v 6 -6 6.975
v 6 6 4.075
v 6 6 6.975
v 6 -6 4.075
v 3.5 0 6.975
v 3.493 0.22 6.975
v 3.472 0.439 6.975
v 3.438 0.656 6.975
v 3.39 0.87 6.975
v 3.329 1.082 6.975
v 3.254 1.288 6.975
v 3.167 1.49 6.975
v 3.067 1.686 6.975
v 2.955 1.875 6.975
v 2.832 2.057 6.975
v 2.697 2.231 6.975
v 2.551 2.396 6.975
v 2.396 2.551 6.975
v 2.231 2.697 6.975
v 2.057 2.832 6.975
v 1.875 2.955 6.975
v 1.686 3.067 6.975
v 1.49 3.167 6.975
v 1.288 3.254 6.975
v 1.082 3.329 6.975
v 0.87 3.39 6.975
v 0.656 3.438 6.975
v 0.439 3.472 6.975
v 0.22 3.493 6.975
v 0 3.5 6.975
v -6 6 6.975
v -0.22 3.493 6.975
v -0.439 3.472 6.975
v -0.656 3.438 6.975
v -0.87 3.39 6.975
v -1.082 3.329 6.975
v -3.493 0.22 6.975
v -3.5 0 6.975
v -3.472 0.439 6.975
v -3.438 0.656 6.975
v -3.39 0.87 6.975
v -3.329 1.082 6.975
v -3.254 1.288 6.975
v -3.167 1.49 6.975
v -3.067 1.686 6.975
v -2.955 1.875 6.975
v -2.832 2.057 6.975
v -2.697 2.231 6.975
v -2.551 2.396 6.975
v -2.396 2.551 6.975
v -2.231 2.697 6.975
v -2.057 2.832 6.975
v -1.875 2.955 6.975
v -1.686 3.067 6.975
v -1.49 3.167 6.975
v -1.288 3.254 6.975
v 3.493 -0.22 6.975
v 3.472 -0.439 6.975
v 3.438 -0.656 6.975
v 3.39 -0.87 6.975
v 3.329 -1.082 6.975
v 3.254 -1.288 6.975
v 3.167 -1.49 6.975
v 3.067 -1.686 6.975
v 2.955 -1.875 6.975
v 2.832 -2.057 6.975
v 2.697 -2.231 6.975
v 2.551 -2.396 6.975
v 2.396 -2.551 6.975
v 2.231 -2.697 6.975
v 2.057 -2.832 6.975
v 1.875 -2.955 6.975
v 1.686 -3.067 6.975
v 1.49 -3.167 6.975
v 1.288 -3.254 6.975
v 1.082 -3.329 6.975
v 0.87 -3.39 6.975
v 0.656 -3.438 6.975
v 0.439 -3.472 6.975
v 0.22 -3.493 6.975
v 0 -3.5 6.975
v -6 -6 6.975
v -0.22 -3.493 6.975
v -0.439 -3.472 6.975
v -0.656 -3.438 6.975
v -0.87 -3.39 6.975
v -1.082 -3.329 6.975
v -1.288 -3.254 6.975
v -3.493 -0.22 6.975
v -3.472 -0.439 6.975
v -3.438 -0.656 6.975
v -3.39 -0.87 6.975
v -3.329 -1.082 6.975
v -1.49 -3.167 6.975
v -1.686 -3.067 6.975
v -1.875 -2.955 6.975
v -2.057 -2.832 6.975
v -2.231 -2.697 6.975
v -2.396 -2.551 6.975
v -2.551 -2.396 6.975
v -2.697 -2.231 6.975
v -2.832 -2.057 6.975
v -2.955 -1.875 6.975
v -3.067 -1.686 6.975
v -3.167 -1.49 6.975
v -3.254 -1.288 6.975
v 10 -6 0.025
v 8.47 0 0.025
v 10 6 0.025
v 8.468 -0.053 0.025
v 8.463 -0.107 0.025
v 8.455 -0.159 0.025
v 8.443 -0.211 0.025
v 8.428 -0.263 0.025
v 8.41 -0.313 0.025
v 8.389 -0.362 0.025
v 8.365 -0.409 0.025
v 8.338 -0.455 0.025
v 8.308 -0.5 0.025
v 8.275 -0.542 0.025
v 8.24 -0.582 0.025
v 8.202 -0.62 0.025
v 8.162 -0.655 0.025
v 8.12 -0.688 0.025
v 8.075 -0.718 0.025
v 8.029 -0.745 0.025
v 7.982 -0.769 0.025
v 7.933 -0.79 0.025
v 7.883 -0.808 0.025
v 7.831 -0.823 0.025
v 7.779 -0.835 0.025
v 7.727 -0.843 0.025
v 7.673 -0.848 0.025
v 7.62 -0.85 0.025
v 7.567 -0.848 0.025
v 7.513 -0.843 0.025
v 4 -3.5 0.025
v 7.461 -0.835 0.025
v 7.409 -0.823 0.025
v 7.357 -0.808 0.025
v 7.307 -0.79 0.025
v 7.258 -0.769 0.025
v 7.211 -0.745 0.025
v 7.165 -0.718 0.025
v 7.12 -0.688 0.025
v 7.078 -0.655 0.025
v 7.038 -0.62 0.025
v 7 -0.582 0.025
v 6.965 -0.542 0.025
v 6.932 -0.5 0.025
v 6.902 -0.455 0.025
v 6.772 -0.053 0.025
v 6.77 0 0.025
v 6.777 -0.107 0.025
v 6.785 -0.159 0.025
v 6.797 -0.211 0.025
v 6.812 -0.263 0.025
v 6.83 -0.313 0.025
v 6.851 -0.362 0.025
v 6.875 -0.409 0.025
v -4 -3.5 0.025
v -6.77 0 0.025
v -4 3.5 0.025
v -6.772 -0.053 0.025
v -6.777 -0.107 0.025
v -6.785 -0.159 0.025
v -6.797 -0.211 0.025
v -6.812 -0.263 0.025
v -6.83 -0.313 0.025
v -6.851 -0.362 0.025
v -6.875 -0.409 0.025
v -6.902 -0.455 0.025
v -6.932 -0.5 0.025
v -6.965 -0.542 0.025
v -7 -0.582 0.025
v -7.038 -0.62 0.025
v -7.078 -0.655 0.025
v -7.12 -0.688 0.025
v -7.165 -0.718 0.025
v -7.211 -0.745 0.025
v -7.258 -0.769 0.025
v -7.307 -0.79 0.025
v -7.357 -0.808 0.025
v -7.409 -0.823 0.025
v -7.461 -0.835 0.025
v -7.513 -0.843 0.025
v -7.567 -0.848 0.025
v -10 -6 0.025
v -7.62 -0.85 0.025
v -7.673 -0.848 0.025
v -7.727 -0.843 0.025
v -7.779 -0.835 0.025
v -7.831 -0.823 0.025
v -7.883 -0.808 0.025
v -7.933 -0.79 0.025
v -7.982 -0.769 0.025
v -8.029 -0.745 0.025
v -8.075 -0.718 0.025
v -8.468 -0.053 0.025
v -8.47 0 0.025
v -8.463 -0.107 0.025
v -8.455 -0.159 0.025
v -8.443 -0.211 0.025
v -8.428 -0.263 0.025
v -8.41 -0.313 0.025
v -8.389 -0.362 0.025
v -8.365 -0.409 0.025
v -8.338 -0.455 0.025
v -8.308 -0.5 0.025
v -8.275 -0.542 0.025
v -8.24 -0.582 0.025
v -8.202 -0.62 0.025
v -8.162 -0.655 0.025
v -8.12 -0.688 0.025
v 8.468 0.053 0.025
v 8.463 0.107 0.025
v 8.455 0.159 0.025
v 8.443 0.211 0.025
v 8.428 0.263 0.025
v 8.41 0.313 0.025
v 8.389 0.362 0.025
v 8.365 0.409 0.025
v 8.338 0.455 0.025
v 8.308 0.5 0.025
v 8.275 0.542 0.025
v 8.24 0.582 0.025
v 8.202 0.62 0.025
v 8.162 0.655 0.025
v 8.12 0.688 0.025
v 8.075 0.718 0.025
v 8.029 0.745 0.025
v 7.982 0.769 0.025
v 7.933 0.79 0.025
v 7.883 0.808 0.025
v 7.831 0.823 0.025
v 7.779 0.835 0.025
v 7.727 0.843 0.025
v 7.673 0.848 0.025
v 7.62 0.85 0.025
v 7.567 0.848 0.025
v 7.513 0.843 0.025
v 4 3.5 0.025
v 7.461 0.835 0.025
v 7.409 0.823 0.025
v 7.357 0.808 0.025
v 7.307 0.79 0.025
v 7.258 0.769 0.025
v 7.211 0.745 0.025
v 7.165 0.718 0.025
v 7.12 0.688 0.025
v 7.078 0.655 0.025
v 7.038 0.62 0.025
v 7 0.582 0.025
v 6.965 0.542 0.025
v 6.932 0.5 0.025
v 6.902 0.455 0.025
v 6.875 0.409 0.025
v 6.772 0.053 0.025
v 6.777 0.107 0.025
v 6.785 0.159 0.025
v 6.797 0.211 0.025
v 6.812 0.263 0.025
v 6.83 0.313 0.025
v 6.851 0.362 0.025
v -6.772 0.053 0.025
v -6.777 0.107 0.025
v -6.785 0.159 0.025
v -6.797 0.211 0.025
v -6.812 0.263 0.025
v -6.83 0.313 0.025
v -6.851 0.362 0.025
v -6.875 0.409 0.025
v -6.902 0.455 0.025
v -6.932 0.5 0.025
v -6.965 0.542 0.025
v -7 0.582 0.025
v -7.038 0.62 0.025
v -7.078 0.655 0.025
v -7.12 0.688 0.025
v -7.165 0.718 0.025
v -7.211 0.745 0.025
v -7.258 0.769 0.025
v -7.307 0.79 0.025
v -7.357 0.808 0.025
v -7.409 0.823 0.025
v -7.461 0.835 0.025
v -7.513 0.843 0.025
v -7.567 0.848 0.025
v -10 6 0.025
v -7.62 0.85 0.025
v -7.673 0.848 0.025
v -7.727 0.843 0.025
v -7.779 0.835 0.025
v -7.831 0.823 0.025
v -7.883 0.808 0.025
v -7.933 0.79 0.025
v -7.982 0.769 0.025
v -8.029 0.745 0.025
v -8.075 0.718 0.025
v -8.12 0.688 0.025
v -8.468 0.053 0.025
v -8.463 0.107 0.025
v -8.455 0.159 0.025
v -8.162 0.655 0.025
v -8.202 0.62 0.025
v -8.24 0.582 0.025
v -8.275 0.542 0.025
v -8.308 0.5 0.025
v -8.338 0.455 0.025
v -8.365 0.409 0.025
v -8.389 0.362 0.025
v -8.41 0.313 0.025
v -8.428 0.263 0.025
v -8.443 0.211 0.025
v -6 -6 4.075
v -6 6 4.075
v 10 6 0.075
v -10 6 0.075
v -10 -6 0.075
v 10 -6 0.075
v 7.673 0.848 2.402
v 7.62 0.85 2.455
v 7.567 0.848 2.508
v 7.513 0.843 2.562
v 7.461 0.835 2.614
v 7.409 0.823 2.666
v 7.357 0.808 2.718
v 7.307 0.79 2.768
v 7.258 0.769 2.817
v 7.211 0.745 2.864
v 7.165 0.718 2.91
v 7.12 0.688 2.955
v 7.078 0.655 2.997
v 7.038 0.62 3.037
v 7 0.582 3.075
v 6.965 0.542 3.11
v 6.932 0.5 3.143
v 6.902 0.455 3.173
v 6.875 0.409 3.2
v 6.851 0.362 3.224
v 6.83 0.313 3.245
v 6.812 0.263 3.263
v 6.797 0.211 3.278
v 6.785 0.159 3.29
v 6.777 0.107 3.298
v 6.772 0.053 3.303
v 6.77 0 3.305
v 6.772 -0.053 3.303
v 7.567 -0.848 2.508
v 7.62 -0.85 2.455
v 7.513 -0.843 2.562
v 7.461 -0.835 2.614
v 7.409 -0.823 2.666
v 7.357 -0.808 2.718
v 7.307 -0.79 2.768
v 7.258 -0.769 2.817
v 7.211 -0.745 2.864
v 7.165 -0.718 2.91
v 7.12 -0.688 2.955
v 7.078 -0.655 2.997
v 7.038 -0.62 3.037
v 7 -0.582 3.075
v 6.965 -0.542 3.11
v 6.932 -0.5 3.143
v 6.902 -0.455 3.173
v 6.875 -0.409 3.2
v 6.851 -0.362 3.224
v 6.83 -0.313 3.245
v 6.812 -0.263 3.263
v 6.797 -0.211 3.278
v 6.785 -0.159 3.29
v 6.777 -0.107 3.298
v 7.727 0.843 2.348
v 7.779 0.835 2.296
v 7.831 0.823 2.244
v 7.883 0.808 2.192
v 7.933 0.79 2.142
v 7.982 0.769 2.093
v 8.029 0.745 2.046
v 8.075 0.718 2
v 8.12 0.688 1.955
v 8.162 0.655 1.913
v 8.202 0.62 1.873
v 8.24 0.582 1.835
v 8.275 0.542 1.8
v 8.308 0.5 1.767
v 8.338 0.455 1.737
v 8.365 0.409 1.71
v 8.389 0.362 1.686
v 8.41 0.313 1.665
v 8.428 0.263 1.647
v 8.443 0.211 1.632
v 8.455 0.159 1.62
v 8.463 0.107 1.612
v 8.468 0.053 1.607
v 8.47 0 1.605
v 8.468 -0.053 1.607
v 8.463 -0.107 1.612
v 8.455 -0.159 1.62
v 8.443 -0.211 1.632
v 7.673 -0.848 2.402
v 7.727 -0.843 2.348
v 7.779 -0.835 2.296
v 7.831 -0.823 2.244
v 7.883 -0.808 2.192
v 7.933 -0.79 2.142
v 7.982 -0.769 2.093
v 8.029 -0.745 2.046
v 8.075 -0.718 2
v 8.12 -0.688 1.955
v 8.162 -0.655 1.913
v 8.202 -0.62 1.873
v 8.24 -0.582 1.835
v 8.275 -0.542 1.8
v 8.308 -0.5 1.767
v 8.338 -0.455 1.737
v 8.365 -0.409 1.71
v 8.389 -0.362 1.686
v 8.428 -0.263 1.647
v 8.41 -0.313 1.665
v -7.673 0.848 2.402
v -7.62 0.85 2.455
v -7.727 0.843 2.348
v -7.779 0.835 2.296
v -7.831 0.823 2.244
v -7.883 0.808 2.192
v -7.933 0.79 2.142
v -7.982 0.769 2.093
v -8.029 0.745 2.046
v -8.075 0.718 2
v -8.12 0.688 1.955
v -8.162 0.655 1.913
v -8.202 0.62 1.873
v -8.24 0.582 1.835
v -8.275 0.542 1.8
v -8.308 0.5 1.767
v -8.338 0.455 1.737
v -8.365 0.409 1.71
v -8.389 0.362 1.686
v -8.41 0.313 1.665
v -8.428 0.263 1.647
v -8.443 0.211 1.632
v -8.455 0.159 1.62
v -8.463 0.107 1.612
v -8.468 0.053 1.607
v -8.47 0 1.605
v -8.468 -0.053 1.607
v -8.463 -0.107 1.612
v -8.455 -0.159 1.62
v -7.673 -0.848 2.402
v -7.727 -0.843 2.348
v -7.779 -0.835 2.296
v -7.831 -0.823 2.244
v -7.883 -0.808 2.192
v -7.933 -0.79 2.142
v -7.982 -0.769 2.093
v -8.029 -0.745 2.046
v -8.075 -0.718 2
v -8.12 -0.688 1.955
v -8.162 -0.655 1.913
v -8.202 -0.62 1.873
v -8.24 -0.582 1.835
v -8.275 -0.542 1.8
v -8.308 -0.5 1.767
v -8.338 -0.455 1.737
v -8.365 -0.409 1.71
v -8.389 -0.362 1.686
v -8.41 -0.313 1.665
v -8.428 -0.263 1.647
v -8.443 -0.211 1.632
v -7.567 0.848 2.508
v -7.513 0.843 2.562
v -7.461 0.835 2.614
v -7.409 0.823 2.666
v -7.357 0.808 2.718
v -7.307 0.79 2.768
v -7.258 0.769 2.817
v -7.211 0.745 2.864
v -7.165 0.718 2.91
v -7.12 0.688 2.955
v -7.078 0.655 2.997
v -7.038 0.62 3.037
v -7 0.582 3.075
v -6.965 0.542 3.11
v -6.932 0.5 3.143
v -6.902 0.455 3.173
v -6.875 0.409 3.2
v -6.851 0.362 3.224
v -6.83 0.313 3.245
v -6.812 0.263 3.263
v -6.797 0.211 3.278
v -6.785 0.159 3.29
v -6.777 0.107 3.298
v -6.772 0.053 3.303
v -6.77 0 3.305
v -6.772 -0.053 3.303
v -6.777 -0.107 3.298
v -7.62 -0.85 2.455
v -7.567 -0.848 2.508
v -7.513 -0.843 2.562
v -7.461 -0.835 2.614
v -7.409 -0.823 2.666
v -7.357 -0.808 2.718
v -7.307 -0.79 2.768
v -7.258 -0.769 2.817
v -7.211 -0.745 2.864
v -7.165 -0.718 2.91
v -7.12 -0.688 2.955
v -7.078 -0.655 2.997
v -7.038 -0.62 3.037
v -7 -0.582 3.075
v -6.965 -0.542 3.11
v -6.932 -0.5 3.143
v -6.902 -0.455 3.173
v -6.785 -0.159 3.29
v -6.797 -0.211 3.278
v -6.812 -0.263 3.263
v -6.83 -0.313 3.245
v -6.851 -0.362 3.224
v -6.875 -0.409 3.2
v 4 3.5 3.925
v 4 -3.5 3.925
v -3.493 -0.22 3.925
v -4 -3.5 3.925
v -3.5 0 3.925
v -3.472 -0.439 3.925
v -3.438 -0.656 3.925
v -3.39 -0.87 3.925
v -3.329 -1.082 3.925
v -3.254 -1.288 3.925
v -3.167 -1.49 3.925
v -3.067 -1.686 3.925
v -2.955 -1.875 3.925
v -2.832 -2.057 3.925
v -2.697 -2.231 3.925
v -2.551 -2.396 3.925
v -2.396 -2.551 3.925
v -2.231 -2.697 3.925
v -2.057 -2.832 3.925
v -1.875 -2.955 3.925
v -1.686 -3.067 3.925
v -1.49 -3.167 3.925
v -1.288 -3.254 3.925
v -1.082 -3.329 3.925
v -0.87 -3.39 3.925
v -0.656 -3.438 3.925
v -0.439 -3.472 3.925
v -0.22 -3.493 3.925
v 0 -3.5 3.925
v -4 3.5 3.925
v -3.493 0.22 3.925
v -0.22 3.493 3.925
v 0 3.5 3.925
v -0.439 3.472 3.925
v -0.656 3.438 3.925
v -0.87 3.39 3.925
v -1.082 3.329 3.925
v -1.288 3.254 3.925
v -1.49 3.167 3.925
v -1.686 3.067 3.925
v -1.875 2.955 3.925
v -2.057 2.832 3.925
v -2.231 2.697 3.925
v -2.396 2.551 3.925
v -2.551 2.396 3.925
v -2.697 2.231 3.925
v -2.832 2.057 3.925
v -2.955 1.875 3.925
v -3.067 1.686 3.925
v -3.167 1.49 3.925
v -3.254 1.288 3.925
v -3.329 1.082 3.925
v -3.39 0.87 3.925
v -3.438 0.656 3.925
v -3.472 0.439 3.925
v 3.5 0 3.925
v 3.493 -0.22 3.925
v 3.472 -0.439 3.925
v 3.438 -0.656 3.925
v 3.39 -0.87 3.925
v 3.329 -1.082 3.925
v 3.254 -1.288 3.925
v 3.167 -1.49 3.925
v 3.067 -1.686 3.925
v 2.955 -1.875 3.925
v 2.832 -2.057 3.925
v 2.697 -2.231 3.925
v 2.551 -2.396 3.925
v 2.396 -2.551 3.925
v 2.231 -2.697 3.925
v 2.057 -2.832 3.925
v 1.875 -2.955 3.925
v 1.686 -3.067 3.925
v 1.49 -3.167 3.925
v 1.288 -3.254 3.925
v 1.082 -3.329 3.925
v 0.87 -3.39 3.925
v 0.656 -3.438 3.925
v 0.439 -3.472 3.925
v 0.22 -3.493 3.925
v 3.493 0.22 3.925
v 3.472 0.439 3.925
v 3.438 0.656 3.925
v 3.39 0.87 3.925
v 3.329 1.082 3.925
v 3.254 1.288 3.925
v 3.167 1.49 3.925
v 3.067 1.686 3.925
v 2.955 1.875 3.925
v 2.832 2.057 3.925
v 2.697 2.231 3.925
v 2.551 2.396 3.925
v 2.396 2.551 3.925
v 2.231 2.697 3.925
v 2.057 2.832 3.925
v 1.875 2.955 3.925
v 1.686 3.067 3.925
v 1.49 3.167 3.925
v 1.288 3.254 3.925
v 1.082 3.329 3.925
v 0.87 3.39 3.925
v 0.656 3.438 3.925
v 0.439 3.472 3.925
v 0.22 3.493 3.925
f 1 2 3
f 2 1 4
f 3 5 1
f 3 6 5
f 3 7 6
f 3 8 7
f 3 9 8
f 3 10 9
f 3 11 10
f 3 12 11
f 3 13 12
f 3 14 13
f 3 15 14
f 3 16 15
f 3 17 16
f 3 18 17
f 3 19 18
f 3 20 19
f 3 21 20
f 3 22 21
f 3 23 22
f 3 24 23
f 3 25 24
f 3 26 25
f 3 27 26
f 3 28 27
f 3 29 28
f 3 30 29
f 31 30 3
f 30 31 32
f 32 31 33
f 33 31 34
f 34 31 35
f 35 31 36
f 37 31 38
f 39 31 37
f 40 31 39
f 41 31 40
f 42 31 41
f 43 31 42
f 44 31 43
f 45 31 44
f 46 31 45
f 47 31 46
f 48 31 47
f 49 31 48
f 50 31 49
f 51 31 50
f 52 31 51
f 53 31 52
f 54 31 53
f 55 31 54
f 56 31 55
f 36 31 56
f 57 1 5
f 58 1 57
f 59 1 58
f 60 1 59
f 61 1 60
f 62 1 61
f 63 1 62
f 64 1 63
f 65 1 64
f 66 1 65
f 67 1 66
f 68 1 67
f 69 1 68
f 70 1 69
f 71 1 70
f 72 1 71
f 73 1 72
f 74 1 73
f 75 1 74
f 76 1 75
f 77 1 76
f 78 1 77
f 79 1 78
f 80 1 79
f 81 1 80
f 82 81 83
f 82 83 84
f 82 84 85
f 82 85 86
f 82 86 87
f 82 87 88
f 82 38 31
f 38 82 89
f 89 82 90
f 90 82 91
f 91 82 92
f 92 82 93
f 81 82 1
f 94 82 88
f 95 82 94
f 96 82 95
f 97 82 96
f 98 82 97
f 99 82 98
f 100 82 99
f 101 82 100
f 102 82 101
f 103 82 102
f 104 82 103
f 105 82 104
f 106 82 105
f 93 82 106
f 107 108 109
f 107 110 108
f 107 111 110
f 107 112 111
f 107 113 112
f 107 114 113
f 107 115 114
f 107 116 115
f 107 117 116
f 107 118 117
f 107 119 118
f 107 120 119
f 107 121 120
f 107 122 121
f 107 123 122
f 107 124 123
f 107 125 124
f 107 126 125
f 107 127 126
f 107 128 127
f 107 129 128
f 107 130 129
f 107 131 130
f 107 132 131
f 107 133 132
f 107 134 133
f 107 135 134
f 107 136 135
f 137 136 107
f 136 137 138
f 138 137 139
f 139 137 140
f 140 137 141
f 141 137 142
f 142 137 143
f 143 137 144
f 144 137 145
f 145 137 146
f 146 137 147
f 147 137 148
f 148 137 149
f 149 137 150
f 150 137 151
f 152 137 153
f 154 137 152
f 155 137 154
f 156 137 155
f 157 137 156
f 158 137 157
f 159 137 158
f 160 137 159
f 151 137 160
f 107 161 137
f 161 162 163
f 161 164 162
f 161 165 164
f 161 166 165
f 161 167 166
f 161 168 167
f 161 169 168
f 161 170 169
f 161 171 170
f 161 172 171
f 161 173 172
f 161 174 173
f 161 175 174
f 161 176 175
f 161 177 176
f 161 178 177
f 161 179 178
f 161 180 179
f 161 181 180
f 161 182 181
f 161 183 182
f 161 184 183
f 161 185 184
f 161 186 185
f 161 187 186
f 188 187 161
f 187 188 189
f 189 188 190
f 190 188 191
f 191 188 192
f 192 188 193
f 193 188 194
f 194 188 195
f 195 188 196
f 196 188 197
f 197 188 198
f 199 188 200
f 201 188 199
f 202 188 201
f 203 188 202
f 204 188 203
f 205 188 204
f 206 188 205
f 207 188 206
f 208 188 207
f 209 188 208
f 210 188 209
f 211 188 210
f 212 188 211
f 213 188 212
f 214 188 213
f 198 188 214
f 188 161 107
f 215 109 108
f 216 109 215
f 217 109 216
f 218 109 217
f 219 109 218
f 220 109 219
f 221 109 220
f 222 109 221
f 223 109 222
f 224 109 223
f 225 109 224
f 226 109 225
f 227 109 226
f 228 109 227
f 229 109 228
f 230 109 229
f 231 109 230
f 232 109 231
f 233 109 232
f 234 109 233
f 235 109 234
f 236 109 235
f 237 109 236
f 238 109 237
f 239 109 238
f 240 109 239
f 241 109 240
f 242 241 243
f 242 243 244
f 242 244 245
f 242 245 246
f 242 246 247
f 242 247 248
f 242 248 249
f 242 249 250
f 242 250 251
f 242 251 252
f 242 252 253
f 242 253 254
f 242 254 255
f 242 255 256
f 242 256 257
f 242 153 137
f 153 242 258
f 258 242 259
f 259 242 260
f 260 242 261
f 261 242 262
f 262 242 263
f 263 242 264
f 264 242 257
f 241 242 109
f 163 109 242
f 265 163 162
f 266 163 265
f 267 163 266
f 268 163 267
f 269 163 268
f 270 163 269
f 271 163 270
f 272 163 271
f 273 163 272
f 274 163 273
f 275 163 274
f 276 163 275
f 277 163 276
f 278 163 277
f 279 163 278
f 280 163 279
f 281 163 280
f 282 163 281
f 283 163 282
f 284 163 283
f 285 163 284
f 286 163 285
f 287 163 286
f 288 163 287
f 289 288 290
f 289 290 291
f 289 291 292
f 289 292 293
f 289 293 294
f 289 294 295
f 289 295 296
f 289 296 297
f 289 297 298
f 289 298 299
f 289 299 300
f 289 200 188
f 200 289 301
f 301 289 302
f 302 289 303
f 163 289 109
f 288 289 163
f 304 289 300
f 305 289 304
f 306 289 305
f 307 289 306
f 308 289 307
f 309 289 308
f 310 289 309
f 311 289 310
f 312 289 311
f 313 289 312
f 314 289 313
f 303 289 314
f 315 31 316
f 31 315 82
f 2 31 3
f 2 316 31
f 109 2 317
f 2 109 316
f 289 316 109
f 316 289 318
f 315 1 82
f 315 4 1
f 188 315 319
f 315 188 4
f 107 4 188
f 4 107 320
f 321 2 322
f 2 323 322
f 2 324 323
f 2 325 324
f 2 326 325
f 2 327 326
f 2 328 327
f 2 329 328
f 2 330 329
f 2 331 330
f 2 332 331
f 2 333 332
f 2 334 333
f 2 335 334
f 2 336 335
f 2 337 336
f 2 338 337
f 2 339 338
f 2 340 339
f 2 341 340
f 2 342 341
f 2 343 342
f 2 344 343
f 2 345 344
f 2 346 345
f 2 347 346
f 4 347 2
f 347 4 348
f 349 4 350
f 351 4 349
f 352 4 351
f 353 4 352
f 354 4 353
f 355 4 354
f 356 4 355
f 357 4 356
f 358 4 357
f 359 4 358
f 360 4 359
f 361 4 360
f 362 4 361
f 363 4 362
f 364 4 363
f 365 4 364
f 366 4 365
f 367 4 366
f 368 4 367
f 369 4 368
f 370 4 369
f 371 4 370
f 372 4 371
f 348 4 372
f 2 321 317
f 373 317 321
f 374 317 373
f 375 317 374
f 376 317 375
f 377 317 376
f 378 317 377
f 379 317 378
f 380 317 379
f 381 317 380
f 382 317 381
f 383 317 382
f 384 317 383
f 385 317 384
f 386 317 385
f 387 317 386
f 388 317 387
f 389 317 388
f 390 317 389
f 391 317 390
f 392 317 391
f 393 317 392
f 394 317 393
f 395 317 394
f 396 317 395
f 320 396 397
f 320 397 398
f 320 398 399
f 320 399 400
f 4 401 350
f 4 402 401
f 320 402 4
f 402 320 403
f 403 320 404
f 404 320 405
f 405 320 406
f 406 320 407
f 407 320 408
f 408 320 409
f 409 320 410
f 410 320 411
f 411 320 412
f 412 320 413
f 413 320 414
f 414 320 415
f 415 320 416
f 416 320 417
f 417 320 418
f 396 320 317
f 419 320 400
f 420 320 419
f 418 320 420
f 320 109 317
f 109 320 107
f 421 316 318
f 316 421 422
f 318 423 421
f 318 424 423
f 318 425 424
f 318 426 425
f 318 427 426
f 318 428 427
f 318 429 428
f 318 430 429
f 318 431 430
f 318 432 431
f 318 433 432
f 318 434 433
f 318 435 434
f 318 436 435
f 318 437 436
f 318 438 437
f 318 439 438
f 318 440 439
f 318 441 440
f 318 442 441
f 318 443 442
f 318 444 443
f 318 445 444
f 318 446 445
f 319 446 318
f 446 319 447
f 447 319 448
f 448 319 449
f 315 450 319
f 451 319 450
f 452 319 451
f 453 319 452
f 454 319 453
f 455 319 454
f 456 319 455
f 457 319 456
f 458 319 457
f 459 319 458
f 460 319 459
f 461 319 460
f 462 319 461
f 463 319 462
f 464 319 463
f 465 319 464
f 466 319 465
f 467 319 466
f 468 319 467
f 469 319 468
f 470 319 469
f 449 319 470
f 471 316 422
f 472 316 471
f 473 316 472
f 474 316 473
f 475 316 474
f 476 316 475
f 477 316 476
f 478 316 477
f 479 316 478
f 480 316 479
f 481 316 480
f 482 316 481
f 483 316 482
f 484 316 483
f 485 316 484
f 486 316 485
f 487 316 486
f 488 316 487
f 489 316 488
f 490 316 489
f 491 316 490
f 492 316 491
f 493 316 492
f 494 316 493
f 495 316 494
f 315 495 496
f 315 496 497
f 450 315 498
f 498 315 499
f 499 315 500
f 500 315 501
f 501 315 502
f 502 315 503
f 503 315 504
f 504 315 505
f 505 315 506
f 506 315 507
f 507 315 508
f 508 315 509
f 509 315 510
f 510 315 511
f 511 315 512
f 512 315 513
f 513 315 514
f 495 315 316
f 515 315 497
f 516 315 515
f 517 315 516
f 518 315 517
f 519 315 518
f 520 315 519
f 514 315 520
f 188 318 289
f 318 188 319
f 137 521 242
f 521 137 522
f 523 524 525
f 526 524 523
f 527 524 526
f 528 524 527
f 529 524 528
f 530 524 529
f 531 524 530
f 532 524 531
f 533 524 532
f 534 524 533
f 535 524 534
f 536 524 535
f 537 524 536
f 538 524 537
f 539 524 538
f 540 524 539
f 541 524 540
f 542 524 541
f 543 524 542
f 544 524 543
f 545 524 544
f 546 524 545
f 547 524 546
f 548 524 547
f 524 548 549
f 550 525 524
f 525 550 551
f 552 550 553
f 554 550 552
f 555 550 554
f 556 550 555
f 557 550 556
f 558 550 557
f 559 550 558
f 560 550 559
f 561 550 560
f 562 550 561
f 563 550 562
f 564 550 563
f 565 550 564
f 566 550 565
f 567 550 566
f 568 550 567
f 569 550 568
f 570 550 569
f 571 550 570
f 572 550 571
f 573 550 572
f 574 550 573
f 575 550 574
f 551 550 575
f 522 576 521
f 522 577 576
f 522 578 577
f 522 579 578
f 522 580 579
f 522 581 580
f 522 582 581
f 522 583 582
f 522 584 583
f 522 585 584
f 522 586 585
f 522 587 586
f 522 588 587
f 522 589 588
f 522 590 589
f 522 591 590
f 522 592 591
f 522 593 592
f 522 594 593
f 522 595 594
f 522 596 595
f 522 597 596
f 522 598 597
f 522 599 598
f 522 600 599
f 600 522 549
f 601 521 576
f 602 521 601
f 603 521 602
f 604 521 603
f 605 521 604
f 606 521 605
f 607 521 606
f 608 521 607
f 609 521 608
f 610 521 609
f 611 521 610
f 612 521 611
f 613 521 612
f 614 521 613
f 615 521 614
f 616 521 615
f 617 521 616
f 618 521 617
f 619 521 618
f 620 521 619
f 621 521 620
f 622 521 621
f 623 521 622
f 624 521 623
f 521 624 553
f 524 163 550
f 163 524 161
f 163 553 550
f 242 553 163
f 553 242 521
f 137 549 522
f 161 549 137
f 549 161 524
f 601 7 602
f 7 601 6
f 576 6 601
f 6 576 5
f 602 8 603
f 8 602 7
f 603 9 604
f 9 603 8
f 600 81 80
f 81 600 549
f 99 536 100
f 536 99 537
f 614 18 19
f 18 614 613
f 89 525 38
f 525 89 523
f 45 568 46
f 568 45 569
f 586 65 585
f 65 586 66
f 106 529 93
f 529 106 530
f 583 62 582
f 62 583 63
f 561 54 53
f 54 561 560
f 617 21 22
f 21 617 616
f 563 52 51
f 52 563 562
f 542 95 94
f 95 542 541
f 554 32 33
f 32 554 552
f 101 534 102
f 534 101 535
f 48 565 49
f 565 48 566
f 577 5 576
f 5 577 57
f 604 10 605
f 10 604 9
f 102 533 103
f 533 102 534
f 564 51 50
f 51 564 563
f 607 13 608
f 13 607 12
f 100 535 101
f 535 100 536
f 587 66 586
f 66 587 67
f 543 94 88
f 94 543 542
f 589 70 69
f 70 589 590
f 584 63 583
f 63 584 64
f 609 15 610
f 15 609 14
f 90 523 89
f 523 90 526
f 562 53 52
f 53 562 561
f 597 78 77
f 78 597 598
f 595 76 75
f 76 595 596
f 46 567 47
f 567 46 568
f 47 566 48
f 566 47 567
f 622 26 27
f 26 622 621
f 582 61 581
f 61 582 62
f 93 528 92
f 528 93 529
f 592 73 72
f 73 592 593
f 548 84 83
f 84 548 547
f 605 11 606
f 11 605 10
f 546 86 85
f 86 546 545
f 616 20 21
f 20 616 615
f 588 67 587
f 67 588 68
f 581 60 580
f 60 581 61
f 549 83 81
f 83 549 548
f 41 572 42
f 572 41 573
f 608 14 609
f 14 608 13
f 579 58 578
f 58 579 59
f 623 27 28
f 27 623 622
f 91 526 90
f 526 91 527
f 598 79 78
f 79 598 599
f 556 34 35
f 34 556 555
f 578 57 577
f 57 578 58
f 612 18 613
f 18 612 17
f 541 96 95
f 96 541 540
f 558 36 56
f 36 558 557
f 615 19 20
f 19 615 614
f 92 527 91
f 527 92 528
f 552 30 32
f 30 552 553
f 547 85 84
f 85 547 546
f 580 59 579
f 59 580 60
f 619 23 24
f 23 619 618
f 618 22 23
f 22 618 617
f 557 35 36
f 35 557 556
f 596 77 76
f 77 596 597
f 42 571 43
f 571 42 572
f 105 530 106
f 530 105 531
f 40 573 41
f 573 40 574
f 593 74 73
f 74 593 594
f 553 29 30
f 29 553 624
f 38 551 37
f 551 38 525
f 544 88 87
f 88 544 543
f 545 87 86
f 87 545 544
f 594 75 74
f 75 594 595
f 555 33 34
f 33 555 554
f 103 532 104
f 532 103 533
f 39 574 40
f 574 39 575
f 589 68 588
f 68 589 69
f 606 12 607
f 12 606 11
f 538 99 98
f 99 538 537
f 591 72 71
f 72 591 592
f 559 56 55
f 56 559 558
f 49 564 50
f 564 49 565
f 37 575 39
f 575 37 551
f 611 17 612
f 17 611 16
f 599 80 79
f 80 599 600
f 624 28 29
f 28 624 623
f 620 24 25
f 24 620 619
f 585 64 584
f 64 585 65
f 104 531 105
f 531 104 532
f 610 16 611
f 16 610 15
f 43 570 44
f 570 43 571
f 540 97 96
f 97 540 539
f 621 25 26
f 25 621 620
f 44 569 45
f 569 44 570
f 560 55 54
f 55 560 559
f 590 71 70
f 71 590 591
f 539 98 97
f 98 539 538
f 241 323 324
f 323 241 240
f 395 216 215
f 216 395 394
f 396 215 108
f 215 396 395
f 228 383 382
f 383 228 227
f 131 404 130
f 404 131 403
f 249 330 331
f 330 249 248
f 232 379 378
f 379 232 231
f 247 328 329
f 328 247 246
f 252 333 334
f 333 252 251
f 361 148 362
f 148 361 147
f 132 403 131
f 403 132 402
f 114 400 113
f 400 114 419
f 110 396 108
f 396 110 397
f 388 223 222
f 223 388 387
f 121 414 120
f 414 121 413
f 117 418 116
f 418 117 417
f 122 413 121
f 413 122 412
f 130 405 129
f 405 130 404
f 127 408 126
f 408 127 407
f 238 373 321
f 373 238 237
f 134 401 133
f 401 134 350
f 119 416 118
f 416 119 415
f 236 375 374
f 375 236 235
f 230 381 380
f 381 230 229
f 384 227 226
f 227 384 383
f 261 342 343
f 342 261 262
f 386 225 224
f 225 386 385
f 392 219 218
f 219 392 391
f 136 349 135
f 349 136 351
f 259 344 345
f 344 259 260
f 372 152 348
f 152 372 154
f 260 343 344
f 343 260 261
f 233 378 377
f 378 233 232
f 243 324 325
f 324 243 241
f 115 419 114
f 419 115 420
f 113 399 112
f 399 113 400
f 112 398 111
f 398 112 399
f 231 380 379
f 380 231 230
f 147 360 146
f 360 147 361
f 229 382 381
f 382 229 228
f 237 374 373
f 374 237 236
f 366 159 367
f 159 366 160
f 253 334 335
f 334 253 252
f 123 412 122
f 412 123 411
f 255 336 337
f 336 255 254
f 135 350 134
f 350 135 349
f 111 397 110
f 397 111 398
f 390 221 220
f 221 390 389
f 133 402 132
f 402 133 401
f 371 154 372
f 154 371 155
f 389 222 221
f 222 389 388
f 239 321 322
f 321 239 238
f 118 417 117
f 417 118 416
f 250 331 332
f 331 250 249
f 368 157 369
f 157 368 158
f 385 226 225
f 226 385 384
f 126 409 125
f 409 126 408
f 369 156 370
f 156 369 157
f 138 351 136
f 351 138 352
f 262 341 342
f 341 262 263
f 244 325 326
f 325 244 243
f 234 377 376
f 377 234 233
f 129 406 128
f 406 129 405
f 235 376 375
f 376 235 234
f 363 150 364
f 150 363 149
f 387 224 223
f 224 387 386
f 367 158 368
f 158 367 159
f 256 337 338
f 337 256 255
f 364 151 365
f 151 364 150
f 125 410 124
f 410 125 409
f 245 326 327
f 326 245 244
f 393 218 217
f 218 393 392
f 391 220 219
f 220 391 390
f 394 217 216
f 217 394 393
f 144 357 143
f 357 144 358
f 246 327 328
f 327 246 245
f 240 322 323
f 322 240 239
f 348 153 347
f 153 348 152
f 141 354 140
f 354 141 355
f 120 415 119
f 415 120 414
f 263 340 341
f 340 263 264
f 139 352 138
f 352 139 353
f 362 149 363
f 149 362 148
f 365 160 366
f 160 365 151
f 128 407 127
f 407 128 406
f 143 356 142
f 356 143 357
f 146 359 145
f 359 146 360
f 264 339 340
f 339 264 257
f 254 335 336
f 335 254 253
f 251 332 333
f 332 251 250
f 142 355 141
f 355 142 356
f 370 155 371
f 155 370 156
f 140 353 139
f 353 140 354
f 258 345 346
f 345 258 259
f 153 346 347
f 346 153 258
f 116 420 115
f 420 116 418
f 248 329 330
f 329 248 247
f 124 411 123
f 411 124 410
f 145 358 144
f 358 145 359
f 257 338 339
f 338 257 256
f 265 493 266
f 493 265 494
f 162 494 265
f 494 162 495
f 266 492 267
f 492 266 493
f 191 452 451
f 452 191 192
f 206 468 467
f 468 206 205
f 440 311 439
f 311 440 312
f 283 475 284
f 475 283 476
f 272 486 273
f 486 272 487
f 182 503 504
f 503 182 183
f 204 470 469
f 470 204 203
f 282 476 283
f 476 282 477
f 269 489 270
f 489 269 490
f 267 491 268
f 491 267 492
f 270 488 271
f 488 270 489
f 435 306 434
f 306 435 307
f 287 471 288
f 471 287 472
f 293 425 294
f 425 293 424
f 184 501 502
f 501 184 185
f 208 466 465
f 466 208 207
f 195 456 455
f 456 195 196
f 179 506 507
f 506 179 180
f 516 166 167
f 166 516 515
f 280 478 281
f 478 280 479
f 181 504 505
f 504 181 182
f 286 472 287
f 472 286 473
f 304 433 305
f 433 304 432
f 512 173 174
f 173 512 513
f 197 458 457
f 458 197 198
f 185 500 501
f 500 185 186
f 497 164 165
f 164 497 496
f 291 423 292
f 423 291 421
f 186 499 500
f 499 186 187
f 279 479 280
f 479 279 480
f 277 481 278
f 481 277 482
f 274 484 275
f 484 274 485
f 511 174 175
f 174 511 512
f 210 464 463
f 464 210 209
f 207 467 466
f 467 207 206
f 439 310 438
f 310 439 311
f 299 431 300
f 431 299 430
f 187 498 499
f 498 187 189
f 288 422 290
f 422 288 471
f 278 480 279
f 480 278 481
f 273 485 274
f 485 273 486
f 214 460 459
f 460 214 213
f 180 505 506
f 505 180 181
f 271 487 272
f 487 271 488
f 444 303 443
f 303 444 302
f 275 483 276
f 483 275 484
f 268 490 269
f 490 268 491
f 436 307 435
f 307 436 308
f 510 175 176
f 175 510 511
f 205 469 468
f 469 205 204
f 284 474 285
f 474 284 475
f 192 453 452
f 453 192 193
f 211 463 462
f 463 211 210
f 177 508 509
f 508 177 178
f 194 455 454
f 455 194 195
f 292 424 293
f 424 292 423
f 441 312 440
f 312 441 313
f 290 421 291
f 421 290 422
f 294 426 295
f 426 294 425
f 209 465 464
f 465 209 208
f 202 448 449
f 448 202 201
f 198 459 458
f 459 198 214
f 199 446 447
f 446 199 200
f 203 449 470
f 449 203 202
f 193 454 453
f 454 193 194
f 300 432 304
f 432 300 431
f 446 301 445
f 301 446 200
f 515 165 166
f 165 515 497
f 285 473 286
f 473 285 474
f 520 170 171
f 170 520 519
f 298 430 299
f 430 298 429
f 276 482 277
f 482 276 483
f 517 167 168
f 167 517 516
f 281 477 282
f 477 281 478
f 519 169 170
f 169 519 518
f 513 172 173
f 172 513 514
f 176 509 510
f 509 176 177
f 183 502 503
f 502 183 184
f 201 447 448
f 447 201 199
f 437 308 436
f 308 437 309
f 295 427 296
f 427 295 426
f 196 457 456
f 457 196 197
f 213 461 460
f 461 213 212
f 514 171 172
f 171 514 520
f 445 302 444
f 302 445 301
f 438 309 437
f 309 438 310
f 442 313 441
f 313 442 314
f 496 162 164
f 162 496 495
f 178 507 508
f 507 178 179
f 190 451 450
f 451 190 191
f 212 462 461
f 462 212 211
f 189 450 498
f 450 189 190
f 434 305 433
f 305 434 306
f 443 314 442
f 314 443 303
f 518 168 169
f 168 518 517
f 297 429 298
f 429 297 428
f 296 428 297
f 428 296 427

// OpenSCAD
$fn = 100;

fudge = 0.05;
fudge2 = 2 * fudge;
fudgez = [0, 0, -fudge];

tol = 0.3;
inch = 25.4;

dim = [12, 12, 7];

button_base_dim = [8, 7, 4];
button_d = 7;

chamfer_z = dim.z - 3;
pcb_dim = [dim.x+8, dim.y, fudge2];

screw_d = 1.7;

difference() {
    union() {
        rounded_cube(dim, 0, "xy");
        hull() {
            rounded_cube(pcb_dim, 0, "xy");
            translate([0, 0, chamfer_z]) rounded_cube([dim.x, dim.y, fudge2], 0, "xy");
        }
    }
    translate(fudgez) {
        rounded_cube(button_base_dim, 0, "xy");
        cylinder(d=button_d, h=dim.z+fudge2);
        translate([0.3*inch, 0, 0]) cylinder(d=screw_d, h=dim.z+fudge2);
        translate([-0.3*inch, 0, 0]) cylinder(d=screw_d, h=dim.z+fudge2);
    }
}


module rounded_cube(dim, r=3, center="") {
    d = 2 * r;
    fudge = 0.05;
    
    x = search("x", center) ? 0 : dim.x/2;
    y = search("y", center) ? 0 : dim.y/2;
    z = search("z", center) ? 0 : dim.z/2;
    translate([x, y, z])
        minkowski() {
            cube(dim - [d, d, fudge], true);
            cylinder(r=r, h=fudge);
        }
}
